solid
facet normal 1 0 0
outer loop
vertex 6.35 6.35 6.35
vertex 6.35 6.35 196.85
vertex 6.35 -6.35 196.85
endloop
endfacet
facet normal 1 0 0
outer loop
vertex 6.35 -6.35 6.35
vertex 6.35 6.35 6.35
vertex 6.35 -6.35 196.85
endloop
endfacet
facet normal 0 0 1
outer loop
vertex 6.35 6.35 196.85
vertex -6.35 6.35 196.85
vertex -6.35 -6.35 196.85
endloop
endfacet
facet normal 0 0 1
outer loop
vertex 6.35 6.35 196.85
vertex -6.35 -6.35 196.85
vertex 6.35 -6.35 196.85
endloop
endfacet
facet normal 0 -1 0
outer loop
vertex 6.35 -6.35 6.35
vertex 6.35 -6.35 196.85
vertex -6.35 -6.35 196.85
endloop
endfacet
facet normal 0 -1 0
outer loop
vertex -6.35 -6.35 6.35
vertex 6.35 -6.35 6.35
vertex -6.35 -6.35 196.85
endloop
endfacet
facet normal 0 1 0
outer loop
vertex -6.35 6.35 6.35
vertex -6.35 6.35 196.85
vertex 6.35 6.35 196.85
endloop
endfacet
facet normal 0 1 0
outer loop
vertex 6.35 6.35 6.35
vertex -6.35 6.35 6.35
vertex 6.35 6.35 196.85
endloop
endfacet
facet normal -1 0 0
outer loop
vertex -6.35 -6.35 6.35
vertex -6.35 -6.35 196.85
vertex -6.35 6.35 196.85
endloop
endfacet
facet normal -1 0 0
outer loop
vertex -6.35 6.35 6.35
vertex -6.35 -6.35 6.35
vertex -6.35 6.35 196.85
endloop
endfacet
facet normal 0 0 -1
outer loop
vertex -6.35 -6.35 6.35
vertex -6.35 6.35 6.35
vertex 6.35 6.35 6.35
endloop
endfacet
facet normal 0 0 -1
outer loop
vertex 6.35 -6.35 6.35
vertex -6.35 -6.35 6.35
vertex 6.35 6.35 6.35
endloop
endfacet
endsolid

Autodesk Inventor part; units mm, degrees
ref_plane "Start plane" through (0, 0, 6.35) normal (0, 0, 1) x (1, 0, 0)
ref_plane "End plane" through (0, 0, 196.85) normal (0, 0, 1) x (1, 0, 0)
sketch "Sketch" plane through (0, 0, 0) normal (0, 0, 1) x (1, 0, 0)
  line L0 (6.35, -6.35) -> (-6.35, -6.35)
  line L1 (-6.35, -6.35) -> (-6.35, 6.35)
  line L2 (-6.35, 6.35) -> (6.35, 6.35)
  line L3 (6.35, 6.35) -> (6.35, -6.35)
  line L4 (-6, 0) -> (8, 0) construction
  line L5 (0, -30) -> (0, 40) construction
  line L6 (0, 54) -> (0, -44) construction
  line L7 (-9.62, 0) -> (13.27, 0) construction
  dimension "d0" = 12.7
  dimension "d1" = 12.7
  dimension "d4" = 6.35
  dimension "d5" = 6.35
extrude "Body" add sketch "Sketch" along normal up to surface (190.5 mm away) from surface at 6.35
sketch "Sketch3" plane through (0, 0, 0) normal (0, 0, 1) x (1, 0, 0)
  line L0 (0, 0) -> (10, 0)
ref_plane "Work Plane3" through (0, 0, 0) normal (0, -1, 0) x (1, 0, 0)
sketch "Sketch4" plane through (0, 0, 0) normal (0, -1, 0) x (1, 0, 0)
  line L0 (-2, 6.35) -> (12, 6.35)
  line L1 (-2, 196.85) -> (12, 196.85)
  dimension "d9" = 190.5
ref_plane "Work Plane8" through (0, 0, 196.85) normal (0, 0, 1) x (1, 0, 0)
split "Split5" plane through (0, 0, 196.85) removes the side toward (0, 0, 1)
ref_plane "Work Plane9" through (-590.0029, -6.35, 6.35) normal (0, 0, -1) x (-1, 0, 0)
split "Split6" plane through (-590.0029, -6.35, 6.35) removes the side toward (0, 0, -1)
equation "\"d0\" = G_W"
equation "\"d1\" = G_H"
equation "\"d4\" = 0.5 * d1"
equation "\"d5\" = 0.5 * d0"
equation "\"d2\" = G_L"
equation "\"G_W\" = 12.7"
equation "\"G_H\" = 12.7"
equation "\"G_L\" = d9"
equation "\"G_OFFSET_START\" = -6.35"
equation "\"G_OFFSET_END\" = -6.35"
equation "\"d6\" = -G_OFFSET_START"
equation "\"d7\" = G_OFFSET_END + B_L"
equation "\"B_L\" = 203.2"
properties part number "AISC - 1/2x1/2 - 7.5" material "Steel, Alloy"
